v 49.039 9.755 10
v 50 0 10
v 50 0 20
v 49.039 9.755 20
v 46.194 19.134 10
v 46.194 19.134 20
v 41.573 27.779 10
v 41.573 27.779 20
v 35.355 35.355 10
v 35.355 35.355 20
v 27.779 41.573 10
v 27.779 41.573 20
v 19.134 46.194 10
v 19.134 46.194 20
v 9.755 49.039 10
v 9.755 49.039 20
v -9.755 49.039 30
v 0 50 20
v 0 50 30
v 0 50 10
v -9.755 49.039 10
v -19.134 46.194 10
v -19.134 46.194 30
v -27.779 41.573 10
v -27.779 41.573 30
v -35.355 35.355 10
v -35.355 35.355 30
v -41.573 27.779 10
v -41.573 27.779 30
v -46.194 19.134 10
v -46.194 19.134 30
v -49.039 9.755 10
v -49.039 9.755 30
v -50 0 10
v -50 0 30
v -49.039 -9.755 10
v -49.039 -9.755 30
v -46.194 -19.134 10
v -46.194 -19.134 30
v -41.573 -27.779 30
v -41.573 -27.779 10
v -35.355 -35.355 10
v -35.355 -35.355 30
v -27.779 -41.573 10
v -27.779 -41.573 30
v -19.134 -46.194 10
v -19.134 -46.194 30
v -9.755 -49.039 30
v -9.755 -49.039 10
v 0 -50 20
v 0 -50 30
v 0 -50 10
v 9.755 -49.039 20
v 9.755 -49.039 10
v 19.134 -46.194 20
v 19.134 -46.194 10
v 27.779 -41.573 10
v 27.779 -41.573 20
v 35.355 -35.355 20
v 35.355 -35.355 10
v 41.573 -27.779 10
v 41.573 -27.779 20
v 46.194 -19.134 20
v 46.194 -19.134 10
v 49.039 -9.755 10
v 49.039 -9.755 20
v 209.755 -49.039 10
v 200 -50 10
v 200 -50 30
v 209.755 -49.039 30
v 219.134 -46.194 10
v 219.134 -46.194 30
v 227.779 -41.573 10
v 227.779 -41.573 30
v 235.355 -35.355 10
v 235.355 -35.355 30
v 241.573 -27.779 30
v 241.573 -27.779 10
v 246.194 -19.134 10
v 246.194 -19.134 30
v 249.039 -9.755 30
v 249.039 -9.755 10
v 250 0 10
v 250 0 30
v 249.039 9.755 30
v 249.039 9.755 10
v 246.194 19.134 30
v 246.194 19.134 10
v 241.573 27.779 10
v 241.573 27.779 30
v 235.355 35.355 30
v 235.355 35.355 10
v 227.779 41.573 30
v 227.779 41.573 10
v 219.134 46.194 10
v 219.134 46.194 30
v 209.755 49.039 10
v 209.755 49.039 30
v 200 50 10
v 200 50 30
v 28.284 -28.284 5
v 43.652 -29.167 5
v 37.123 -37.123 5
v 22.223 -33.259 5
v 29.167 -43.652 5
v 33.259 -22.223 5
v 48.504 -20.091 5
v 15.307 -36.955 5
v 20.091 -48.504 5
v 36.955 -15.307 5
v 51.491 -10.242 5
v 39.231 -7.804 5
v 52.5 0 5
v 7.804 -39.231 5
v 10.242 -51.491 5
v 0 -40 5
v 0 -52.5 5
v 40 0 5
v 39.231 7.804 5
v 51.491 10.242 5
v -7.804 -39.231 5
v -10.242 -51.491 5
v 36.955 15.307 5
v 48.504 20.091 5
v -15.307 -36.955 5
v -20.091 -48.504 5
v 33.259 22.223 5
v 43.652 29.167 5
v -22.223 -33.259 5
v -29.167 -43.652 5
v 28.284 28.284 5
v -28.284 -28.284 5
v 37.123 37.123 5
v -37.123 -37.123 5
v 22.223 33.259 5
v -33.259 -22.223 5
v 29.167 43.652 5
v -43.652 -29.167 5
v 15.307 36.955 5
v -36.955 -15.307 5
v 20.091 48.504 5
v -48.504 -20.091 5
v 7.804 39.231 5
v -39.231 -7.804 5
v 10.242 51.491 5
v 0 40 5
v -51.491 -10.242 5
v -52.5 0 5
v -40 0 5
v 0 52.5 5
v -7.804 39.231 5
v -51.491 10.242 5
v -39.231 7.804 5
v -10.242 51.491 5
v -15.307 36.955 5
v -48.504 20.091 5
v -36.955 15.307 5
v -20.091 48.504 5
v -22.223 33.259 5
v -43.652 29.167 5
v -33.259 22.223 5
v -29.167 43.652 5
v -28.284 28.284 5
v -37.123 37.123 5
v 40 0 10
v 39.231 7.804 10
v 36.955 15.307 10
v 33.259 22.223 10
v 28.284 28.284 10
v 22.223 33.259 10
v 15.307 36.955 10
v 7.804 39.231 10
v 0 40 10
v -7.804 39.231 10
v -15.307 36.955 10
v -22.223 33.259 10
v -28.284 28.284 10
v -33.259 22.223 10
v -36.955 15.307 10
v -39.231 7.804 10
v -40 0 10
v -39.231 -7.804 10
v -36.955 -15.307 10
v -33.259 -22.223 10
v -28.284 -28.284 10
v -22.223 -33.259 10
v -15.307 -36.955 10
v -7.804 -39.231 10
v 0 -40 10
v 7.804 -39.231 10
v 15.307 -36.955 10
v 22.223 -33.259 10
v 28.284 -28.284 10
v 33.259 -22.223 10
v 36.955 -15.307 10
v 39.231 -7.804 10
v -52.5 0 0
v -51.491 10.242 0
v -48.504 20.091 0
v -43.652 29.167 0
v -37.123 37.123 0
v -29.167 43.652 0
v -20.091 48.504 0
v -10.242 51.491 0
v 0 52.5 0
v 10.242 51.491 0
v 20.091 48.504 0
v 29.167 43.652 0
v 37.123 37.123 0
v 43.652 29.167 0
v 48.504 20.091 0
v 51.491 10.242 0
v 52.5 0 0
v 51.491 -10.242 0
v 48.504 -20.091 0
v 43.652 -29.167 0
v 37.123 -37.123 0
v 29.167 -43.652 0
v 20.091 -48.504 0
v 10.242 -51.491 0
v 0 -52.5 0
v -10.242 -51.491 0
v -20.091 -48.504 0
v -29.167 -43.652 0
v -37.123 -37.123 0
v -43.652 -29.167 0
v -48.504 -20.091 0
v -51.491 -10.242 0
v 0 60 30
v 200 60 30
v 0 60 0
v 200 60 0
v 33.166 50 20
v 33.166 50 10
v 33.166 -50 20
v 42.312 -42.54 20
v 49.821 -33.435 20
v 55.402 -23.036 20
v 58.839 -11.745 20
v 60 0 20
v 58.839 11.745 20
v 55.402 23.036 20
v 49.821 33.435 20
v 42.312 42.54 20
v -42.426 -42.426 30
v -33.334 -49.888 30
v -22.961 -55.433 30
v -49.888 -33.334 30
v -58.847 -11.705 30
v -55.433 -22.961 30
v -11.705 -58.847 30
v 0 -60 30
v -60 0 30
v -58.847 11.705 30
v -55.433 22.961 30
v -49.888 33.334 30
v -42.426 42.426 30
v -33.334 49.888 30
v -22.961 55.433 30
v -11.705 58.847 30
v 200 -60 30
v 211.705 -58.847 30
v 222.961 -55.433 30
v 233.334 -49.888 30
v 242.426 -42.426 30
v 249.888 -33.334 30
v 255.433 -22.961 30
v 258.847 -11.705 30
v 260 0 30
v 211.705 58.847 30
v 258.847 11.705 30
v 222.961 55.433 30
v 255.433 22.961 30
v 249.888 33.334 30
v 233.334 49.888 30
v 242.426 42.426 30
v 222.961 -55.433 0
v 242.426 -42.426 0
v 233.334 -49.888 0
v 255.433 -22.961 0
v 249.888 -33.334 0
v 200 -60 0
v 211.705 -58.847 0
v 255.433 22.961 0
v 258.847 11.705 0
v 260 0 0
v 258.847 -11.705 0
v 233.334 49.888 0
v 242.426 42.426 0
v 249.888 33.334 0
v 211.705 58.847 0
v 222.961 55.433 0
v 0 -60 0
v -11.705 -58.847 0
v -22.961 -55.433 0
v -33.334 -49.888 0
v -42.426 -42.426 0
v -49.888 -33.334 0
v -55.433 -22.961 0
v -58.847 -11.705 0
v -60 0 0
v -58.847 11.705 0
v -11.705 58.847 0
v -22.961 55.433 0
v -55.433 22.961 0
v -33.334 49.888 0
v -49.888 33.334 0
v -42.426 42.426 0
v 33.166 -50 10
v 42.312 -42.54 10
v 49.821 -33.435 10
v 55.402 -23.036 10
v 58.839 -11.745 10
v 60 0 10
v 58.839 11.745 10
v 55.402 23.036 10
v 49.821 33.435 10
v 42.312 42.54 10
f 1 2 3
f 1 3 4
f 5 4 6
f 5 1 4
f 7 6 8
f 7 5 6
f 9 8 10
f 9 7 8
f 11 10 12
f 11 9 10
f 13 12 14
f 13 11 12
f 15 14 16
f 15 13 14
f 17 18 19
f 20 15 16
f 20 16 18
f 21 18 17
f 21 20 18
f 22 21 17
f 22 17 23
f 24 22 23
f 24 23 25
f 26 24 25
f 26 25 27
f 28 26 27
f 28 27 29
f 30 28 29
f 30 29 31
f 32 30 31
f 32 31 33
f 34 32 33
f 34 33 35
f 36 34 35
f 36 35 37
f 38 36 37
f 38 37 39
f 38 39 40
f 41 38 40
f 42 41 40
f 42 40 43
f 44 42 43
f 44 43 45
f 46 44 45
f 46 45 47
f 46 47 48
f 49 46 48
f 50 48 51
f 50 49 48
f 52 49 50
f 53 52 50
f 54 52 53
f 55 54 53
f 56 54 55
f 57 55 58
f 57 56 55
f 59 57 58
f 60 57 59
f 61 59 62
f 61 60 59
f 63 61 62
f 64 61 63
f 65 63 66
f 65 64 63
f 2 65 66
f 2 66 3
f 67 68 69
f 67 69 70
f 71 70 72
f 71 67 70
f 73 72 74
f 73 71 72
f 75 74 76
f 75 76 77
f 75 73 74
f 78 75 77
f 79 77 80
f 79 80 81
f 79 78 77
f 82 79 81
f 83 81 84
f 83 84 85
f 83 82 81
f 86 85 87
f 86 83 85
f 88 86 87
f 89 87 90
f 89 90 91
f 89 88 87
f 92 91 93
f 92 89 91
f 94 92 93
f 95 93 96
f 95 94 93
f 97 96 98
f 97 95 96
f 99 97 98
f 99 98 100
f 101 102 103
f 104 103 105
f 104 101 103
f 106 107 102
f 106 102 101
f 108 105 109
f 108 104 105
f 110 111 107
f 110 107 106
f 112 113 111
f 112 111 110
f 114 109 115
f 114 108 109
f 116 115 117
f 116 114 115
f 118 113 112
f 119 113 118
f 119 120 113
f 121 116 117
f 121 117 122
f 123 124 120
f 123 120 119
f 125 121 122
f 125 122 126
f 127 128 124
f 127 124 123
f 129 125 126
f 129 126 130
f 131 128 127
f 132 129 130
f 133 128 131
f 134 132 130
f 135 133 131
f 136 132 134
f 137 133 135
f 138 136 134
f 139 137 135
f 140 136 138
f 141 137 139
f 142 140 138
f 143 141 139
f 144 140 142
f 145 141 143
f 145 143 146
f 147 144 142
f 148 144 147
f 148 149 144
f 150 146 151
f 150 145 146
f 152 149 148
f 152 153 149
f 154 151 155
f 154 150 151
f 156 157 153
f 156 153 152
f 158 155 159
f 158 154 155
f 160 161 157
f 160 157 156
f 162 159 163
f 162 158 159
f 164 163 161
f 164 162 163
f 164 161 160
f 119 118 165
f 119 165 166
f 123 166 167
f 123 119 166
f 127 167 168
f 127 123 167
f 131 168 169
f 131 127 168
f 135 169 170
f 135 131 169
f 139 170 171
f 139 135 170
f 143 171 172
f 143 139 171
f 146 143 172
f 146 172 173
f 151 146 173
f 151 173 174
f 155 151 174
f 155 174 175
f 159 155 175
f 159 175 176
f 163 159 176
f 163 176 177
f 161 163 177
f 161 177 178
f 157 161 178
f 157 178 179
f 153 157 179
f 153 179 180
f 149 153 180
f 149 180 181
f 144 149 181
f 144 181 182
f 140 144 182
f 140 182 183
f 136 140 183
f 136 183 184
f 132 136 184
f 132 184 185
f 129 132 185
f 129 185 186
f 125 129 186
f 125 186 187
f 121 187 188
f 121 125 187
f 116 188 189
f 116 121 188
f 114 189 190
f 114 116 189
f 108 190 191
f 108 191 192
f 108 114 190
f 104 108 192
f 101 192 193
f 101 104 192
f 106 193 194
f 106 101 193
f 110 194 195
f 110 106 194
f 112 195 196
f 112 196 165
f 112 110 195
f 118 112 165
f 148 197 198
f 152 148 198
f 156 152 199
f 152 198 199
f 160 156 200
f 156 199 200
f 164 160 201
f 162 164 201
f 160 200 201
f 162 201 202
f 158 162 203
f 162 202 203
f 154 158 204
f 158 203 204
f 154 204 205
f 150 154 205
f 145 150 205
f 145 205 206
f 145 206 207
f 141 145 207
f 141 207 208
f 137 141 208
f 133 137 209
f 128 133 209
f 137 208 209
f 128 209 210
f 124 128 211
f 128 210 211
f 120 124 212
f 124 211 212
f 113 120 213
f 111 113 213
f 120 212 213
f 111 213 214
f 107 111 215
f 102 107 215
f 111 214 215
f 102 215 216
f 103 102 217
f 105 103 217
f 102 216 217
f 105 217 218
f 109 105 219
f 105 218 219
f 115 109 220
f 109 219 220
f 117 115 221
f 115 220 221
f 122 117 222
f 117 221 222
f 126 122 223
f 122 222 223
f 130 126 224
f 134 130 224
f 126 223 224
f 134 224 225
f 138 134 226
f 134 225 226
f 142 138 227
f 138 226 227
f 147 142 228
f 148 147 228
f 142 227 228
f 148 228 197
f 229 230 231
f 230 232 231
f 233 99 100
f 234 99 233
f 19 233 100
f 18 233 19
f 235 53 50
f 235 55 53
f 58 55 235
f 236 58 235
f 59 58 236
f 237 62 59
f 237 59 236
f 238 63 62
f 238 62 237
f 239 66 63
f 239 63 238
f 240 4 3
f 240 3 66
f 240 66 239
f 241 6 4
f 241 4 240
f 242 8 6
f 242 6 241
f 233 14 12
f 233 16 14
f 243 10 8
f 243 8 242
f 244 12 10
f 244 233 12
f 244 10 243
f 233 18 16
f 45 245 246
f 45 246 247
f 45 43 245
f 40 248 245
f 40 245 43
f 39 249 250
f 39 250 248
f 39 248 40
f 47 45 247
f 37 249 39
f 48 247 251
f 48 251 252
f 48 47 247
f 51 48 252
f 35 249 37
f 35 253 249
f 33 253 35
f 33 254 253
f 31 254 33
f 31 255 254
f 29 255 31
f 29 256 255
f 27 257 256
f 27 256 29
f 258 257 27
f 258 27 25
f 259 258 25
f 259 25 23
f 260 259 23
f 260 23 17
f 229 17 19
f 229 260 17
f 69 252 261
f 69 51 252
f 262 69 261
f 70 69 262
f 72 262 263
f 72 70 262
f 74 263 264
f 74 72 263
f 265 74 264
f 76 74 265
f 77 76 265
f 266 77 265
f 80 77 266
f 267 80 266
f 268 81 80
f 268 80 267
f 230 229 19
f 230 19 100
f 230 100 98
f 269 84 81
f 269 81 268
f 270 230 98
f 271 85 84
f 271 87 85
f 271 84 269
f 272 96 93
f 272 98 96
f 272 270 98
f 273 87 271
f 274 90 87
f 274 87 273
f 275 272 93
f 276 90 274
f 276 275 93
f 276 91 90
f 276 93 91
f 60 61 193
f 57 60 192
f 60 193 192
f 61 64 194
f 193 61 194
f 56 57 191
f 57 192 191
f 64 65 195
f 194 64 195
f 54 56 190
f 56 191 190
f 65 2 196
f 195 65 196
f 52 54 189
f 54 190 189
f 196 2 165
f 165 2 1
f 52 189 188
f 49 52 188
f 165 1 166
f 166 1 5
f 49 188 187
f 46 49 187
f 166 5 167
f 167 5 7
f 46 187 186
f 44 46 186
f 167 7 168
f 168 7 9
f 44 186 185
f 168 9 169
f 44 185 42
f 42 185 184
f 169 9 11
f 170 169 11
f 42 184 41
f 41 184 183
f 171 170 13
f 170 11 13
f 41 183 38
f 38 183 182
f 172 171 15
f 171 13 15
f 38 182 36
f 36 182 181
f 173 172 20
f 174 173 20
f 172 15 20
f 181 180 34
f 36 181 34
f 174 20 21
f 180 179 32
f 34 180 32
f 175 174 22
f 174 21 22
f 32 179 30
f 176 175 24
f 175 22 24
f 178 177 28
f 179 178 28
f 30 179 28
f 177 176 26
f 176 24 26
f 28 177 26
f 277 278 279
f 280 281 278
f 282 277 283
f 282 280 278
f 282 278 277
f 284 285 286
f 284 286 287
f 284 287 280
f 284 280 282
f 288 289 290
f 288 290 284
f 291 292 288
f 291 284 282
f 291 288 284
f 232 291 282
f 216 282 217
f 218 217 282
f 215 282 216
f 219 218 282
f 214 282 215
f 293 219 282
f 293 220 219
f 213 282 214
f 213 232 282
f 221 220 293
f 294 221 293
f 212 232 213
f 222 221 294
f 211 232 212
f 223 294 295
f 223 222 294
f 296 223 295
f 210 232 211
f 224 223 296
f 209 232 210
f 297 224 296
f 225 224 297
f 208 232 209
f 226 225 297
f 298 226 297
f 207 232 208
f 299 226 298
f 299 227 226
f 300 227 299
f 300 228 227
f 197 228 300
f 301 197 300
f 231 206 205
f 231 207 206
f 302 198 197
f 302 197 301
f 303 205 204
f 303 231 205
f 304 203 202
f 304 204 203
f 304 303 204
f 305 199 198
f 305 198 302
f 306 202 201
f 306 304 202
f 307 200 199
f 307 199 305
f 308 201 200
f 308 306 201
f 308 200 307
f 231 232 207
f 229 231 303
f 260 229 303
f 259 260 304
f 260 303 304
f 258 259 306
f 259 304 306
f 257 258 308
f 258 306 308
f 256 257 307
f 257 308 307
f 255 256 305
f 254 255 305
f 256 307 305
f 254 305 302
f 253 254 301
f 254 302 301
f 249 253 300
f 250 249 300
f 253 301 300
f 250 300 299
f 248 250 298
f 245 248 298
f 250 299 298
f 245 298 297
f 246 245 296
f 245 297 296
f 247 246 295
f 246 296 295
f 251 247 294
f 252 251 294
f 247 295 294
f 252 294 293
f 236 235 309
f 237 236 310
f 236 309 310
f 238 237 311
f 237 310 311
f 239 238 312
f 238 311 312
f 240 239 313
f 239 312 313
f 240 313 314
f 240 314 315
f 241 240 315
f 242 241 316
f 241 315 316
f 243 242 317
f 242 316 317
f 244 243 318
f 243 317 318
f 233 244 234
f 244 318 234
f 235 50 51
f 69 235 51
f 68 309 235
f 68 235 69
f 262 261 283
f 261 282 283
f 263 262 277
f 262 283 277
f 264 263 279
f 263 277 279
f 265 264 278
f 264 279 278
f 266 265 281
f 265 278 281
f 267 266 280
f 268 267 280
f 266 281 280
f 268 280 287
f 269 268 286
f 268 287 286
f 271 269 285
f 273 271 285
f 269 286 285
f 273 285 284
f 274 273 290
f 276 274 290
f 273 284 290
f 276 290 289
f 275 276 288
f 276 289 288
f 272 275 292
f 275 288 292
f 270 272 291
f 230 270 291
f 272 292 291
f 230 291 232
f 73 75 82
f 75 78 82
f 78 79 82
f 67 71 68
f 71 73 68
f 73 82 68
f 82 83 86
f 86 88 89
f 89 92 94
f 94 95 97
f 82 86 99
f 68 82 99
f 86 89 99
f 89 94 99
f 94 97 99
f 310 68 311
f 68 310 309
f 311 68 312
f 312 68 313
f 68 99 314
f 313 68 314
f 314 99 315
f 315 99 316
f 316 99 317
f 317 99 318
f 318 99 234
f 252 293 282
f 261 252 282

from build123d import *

# Parameters (mm, degrees)
SKETCH1_R           = 40
BOSS_EXTRUDE1_DEPTH = 10
SKETCH2_R           = 52.5
CUT_EXTRUDE1_DEPTH  = 5
SKETCH3_R           = 50
BOSS_EXTRUDE2_DEPTH = 10
BOSS_EXTRUDE3_DEPTH = 20


with BuildPart() as part:
    # Sketch1 → Boss-Extrude1 (new body)
    with BuildSketch(Plane.XY):
        with BuildLine():
            Line((0, 60), (200, 60))
            ThreePointArc((200, 60), (260, 0), (200, -60))
            Line((200, -60), (0, -60))
            ThreePointArc((0, -60), (-60, 0), (0, 60))
        make_face()
        Circle(SKETCH1_R, mode=Mode.SUBTRACT)
    extrude(amount=BOSS_EXTRUDE1_DEPTH)

    # Sketch2 → Cut-Extrude1 (cut)
    with BuildSketch(Plane(origin=(0, 0, 0), x_dir=(-1, 0, 0), z_dir=(0, 0, -1))):
        Circle(SKETCH2_R)
    extrude(amount=-CUT_EXTRUDE1_DEPTH, mode=Mode.SUBTRACT)

    # Sketch3 → Boss-Extrude2 (add)
    with BuildSketch(Plane.XY.offset(10)):
        with BuildLine():
            ThreePointArc((0, -60), (42.426406871, -42.426406871), (60, 0))
            ThreePointArc((60, 0), (42.426406871, 42.426406871), (0, 60))
            ThreePointArc((0, 60), (-60, 0), (0, -60))
        make_face()
        Circle(SKETCH3_R, mode=Mode.SUBTRACT)
    extrude(amount=BOSS_EXTRUDE2_DEPTH)

    # Sketch4 → Boss-Extrude3 (add)
    with BuildSketch(Plane.XY.offset(10)):
        with BuildLine():
            Line((0, -60), (200, -60))
            ThreePointArc((200, -60), (260, 0), (200, 60))
            Line((200, 60), (0, 60))
            ThreePointArc((0, 60), (-60, 0), (0, -60))
        make_face()
        with BuildLine():
            Line((0, -50), (200, -50))
            ThreePointArc((200, -50), (250, 0), (200, 50))
            Line((200, 50), (0, 50))
            ThreePointArc((0, 50), (-50, 0), (0, -50))
        make_face(mode=Mode.SUBTRACT)
    extrude(amount=BOSS_EXTRUDE3_DEPTH)


solid = part.part
